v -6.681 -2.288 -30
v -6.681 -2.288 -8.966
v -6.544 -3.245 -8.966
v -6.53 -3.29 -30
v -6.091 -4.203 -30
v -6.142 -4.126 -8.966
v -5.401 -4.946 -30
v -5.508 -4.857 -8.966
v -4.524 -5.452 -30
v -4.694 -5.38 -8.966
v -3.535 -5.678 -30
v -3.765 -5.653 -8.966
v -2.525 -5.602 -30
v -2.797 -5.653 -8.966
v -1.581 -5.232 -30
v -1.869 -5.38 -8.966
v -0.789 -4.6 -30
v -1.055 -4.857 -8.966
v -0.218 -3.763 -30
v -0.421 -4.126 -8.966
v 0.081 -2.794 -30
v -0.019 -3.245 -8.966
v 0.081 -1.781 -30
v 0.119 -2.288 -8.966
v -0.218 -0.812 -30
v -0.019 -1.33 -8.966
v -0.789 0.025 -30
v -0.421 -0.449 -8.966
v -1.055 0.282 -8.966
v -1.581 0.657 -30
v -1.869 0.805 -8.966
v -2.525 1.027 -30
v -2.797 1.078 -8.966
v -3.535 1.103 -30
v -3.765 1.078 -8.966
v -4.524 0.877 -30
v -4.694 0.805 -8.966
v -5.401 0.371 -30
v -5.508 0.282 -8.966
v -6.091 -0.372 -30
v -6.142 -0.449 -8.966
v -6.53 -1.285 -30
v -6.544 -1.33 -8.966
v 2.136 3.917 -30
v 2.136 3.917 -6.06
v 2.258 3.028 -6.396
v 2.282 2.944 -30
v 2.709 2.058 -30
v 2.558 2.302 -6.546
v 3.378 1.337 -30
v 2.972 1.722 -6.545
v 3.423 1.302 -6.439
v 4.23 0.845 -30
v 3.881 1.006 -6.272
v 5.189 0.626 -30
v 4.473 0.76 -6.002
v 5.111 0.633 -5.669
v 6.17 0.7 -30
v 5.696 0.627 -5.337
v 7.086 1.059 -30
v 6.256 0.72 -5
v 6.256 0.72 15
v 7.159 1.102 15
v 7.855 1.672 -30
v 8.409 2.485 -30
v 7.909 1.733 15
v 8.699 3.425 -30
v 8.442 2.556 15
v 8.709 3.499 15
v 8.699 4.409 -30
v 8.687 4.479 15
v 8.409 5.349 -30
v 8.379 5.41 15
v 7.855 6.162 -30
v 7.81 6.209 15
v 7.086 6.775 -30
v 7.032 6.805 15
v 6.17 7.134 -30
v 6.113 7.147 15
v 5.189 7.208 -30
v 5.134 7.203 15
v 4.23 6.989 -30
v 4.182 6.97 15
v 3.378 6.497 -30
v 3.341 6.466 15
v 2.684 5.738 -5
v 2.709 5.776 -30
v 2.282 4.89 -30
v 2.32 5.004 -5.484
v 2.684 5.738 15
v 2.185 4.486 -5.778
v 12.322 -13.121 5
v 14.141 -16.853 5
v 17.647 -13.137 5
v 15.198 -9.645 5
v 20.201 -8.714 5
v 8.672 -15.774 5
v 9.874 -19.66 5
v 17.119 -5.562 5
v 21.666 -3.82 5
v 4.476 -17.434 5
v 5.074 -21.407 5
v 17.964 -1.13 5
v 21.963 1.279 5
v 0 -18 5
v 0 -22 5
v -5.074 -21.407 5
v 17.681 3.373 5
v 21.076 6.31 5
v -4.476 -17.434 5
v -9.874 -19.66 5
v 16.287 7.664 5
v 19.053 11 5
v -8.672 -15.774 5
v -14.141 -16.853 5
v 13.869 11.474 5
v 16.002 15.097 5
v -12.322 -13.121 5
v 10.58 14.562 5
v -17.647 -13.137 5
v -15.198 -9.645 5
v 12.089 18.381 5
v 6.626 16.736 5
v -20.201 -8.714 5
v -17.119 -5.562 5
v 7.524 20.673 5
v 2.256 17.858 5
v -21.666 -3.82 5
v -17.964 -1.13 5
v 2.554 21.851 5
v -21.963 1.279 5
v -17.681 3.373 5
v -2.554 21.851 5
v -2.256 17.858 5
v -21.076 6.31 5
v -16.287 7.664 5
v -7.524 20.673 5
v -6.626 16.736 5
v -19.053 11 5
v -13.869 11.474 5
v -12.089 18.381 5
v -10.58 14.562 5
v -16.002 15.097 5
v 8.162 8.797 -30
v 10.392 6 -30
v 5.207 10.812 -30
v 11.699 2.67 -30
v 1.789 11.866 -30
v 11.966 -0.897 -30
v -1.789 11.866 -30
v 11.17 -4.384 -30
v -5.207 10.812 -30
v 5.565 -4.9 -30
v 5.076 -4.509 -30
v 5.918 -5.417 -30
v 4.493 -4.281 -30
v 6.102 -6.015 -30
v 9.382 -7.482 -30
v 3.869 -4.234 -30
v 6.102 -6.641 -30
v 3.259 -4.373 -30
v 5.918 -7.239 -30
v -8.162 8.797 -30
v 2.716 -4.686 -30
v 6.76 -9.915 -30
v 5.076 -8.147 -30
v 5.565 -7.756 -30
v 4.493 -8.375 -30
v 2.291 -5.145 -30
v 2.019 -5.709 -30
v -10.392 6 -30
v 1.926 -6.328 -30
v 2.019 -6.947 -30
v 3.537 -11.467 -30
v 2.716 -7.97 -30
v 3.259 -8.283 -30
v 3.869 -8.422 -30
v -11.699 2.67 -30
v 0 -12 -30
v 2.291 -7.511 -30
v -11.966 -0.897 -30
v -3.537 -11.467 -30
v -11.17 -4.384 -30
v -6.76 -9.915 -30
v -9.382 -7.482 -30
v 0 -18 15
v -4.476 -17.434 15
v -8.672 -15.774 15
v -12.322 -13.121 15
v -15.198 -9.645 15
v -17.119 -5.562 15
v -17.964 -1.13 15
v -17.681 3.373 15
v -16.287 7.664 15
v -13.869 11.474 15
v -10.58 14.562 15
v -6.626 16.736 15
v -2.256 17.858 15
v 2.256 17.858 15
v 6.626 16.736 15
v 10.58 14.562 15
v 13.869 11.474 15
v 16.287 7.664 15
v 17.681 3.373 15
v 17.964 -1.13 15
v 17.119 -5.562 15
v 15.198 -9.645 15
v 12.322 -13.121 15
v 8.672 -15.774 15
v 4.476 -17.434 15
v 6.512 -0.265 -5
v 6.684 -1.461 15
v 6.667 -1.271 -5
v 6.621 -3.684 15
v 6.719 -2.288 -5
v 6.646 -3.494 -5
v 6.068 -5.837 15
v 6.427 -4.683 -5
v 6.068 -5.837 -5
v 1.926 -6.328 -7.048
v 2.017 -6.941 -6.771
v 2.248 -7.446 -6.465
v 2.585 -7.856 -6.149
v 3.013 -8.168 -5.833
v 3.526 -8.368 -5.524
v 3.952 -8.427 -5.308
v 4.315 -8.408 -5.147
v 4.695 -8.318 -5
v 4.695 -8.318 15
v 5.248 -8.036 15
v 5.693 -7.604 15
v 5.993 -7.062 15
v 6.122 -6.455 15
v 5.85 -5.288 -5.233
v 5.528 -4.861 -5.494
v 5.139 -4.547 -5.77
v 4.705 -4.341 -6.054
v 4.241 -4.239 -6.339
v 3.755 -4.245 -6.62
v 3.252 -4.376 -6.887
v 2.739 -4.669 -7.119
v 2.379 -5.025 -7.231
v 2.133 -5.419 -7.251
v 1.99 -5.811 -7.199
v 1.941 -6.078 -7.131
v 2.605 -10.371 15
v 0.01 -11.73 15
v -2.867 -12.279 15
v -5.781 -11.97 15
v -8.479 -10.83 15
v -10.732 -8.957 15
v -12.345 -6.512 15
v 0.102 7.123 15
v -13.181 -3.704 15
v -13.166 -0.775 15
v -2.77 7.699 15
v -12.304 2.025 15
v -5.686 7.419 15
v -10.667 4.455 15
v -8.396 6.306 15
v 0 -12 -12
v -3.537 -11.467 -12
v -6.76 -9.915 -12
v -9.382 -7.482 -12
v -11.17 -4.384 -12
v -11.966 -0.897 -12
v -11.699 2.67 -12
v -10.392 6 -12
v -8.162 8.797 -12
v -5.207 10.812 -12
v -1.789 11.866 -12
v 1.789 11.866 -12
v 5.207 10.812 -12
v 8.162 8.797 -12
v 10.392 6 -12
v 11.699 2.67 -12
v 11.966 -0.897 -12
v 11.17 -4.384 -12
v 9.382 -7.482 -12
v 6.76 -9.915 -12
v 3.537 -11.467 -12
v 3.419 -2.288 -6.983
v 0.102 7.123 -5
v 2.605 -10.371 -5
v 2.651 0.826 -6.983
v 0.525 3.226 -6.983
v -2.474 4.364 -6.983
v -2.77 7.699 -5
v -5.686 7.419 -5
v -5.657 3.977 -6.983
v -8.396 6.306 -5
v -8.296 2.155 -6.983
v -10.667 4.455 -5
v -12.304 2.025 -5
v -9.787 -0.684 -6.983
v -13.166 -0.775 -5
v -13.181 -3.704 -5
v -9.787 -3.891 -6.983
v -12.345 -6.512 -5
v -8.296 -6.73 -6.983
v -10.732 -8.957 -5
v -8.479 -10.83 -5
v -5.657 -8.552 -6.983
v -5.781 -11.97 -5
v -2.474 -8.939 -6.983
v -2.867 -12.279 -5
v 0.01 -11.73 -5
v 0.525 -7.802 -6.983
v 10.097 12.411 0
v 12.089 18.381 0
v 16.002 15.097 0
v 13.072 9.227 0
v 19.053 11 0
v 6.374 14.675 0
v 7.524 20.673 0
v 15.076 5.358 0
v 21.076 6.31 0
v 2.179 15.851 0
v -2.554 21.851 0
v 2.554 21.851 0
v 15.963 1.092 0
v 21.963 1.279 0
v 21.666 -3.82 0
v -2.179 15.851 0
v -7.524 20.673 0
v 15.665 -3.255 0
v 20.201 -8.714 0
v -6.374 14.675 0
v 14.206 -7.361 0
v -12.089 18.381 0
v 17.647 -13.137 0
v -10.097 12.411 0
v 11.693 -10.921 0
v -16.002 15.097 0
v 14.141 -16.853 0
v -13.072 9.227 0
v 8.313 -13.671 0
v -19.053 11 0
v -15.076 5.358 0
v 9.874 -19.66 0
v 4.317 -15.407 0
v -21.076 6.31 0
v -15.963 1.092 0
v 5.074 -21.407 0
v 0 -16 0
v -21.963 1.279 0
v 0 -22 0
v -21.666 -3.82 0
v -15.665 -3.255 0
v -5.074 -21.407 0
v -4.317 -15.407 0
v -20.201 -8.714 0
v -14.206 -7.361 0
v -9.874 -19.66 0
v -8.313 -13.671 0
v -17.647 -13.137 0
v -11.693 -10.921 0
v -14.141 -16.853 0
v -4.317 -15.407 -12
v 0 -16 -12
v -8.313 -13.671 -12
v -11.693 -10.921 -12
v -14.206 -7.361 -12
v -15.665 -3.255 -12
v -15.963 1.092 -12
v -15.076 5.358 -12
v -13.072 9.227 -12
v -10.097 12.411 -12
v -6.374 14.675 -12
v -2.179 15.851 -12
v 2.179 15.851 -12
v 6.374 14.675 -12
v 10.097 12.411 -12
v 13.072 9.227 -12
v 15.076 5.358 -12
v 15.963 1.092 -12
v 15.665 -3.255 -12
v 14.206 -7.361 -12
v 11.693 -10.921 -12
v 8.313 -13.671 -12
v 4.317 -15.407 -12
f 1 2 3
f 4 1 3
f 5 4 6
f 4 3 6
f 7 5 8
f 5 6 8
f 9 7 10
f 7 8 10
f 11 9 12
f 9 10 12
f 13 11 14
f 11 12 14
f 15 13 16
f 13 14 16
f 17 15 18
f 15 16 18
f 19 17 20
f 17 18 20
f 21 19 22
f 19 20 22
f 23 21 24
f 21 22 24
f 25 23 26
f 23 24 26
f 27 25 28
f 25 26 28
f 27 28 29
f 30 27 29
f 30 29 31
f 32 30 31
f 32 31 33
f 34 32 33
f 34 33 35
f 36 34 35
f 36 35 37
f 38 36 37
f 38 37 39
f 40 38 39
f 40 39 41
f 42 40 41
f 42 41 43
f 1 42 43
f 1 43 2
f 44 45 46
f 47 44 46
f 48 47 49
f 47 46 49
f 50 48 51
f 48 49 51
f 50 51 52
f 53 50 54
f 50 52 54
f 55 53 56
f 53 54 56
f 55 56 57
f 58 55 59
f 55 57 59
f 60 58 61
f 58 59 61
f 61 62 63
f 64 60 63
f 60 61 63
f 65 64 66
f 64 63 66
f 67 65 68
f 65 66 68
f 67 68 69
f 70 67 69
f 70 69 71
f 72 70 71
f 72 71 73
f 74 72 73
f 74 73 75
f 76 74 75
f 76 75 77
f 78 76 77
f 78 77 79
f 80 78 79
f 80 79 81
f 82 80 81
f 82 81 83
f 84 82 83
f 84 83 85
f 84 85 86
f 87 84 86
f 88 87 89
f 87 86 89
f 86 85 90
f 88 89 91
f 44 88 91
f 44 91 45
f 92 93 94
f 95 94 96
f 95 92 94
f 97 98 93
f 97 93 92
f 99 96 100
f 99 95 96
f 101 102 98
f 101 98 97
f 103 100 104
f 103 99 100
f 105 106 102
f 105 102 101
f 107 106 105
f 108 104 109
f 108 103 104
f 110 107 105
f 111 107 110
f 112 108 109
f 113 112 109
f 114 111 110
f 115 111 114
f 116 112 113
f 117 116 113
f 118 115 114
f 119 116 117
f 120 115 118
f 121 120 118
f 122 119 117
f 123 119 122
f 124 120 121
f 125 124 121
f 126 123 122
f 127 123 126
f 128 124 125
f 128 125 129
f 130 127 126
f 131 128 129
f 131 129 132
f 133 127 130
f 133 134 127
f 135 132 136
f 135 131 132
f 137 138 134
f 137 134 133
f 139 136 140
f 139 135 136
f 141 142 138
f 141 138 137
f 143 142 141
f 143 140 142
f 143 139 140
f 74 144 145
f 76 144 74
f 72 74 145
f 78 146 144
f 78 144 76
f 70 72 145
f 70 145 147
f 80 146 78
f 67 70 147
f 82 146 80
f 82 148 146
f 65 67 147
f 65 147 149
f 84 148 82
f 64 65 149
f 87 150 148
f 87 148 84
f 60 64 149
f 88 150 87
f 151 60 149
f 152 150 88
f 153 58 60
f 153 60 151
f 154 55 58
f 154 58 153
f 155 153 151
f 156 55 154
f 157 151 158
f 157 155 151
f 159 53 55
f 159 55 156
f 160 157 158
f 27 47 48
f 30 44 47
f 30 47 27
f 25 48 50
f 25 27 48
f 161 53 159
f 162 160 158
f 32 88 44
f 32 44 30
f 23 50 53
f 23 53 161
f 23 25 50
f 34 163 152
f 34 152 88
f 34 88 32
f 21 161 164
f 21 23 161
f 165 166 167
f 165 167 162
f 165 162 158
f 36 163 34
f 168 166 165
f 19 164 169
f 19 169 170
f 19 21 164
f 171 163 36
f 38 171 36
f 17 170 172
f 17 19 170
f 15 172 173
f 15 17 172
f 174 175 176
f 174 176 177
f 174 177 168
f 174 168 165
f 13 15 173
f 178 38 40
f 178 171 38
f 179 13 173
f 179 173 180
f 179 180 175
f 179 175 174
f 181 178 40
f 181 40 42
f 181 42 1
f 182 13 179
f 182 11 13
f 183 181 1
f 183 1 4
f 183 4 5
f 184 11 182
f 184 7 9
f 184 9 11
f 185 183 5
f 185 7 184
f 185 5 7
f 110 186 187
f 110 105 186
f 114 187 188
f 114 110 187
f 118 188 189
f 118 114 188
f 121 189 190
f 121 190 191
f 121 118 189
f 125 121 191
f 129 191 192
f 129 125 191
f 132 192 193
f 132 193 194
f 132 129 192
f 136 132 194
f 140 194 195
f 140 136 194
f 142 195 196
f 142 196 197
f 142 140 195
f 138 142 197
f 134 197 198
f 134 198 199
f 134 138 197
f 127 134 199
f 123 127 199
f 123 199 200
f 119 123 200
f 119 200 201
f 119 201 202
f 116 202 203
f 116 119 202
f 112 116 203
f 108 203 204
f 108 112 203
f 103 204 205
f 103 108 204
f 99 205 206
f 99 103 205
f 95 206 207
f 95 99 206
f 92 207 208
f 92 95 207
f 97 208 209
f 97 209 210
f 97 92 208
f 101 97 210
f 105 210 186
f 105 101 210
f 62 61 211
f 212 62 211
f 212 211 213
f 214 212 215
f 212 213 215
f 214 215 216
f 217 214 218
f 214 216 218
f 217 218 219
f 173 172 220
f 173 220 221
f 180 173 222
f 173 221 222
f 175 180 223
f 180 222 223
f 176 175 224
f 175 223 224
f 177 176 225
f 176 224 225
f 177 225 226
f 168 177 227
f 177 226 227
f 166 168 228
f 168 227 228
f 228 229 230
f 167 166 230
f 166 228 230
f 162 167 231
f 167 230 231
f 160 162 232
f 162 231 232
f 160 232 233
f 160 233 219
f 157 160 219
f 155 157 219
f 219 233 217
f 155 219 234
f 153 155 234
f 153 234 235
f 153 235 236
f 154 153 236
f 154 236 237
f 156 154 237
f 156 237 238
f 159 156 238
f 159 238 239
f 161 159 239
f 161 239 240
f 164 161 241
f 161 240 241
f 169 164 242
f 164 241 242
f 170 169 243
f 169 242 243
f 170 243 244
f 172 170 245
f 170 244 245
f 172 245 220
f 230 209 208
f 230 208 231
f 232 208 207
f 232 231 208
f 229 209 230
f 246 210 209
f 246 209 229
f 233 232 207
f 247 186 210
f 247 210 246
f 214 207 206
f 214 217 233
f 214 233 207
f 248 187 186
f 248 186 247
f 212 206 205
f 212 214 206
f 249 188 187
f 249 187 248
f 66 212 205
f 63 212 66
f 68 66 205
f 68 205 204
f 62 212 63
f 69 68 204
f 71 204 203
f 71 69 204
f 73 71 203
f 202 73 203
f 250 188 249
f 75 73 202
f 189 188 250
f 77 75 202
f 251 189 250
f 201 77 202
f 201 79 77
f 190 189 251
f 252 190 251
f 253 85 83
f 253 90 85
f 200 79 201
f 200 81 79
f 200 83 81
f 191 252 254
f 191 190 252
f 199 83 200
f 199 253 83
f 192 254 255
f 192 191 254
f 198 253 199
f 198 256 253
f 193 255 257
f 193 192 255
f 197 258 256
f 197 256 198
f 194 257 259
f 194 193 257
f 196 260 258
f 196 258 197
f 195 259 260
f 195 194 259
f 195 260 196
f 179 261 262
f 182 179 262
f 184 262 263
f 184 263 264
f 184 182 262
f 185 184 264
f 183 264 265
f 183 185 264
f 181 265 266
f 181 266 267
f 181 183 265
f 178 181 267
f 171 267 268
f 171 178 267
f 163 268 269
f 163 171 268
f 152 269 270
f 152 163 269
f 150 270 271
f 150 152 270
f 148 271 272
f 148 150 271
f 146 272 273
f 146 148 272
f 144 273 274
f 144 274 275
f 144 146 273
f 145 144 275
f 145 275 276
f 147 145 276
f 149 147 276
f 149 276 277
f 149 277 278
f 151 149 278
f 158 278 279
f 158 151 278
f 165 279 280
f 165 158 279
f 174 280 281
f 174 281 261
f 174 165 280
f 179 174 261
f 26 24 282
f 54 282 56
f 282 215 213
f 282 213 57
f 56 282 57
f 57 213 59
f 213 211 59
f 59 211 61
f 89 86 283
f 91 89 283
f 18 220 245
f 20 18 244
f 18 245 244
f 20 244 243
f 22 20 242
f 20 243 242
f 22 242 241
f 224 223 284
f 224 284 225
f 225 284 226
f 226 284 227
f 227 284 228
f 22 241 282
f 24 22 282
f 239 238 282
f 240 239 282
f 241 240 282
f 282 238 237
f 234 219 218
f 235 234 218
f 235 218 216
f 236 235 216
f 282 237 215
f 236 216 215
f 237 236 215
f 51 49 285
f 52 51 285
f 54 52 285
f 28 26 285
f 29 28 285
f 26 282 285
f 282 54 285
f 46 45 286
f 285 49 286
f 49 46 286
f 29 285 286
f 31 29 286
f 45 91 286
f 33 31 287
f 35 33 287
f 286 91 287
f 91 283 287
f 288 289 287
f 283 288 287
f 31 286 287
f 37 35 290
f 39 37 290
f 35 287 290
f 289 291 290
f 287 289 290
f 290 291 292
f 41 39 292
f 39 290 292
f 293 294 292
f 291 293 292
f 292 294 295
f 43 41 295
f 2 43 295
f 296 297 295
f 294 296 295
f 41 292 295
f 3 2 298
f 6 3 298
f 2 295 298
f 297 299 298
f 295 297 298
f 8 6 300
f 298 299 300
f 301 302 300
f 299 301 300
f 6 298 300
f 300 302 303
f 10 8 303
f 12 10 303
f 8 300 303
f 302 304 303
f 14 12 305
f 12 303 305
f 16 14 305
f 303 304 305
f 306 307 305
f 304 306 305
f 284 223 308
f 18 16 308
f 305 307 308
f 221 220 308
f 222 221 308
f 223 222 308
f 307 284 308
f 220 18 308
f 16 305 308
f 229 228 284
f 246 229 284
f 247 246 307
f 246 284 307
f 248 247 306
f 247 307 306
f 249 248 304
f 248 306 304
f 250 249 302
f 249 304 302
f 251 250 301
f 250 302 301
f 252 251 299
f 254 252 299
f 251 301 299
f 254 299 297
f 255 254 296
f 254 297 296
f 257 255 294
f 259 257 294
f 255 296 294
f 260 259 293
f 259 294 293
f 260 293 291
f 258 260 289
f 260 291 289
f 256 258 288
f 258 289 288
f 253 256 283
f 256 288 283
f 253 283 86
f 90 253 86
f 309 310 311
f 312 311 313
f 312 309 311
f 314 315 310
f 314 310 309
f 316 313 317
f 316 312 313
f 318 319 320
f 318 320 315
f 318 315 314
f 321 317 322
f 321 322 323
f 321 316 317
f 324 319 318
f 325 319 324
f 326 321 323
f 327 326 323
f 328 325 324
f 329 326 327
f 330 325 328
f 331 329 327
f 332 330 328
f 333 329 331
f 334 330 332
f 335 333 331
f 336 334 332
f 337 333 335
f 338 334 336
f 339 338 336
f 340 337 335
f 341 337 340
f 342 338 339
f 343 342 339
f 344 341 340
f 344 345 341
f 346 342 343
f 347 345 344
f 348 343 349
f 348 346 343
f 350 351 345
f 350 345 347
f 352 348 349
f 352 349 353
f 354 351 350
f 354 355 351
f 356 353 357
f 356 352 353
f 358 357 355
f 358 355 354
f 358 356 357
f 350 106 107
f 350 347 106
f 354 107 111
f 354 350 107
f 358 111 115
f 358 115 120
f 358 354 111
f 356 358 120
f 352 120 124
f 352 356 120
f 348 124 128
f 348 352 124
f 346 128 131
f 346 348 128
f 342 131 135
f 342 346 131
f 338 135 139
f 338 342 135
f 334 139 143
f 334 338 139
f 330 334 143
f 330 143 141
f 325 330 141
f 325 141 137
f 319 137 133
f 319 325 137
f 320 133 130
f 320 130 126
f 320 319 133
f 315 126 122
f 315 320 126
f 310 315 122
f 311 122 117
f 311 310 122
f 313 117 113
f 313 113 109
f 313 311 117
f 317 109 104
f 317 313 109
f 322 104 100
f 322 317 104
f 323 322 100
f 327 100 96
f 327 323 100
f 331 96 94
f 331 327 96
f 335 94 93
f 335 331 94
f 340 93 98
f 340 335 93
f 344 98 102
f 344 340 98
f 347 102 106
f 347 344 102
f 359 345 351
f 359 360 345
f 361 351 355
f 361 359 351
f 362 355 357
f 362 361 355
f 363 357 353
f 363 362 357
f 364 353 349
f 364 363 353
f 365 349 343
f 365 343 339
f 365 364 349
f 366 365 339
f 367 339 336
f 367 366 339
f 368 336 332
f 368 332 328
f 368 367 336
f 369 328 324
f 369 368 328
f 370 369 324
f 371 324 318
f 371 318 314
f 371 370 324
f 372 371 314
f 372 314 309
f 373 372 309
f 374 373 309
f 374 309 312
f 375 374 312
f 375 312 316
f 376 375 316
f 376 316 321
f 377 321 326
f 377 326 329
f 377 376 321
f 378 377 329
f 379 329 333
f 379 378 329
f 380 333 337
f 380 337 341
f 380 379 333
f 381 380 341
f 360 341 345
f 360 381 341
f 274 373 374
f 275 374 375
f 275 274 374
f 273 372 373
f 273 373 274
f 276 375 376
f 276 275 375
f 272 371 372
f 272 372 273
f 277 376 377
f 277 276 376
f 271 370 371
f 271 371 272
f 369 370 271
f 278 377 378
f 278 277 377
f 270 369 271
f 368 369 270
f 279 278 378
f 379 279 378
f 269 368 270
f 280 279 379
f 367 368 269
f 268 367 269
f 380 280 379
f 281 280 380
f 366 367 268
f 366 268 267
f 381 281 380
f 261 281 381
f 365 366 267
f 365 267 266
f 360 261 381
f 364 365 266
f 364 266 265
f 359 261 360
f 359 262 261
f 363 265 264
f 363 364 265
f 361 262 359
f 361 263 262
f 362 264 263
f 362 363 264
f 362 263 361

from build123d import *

# Parameters (mm, degrees)
F4_D     = 4.2
F5_D     = 6.8
F6_D     = 6.6
F8_D     = 20
F8_DEPTH = 20
F8_TIP   = 6.0086061903


with BuildPart() as f2:
    # F1 (on Right) → F2 (revolve)
    with BuildSketch(Plane.YZ):
        Polygon((0, 0), (-16, 0), (-16, -12), (-12, -12), (-12, -30), (0, -30), align=None)
        Polygon((-22, 5), (-22, 0), (-16, 0), (0, 0), (0, 15), (-18, 15), (-18, 5), align=None)
    revolve(axis=Axis((0, 0, -7.8081190586), (0, 0, -1)))

    # F4 (through all)
    with Locations(Plane(origin=(0, 0, -30), x_dir=(1, 0, 0), z_dir=(0, 0, -1))):
        with Locations((4.0257674055, 6.3279694055)):
            Hole(F4_D / 2)

    # F5 (through all)
    with Locations(Plane(origin=(0, 0, -30), x_dir=(1, 0, 0), z_dir=(0, 0, -1))):
        with Locations((-3.2813517626, 2.2875162535)):
            Hole(F5_D / 2)

    # F6 (through all)
    with Locations(Plane(origin=(0, 0, -30), x_dir=(1, 0, 0), z_dir=(0, 0, -1))):
        with Locations((5.4357488604, -3.9169674911)):
            Hole(F6_D / 2)

    # F8
    with Locations(Plane.XY.offset(15)):
        with Locations((-3.2813517626, -2.2875162535)):
            Hole(F8_D / 2, depth=F8_DEPTH)
            with Locations((0, 0, -(F8_DEPTH + F8_TIP / 2))):  # 118° drill point
                Cone(0, F8_D / 2, F8_TIP, mode=Mode.SUBTRACT)


solid = f2.part
